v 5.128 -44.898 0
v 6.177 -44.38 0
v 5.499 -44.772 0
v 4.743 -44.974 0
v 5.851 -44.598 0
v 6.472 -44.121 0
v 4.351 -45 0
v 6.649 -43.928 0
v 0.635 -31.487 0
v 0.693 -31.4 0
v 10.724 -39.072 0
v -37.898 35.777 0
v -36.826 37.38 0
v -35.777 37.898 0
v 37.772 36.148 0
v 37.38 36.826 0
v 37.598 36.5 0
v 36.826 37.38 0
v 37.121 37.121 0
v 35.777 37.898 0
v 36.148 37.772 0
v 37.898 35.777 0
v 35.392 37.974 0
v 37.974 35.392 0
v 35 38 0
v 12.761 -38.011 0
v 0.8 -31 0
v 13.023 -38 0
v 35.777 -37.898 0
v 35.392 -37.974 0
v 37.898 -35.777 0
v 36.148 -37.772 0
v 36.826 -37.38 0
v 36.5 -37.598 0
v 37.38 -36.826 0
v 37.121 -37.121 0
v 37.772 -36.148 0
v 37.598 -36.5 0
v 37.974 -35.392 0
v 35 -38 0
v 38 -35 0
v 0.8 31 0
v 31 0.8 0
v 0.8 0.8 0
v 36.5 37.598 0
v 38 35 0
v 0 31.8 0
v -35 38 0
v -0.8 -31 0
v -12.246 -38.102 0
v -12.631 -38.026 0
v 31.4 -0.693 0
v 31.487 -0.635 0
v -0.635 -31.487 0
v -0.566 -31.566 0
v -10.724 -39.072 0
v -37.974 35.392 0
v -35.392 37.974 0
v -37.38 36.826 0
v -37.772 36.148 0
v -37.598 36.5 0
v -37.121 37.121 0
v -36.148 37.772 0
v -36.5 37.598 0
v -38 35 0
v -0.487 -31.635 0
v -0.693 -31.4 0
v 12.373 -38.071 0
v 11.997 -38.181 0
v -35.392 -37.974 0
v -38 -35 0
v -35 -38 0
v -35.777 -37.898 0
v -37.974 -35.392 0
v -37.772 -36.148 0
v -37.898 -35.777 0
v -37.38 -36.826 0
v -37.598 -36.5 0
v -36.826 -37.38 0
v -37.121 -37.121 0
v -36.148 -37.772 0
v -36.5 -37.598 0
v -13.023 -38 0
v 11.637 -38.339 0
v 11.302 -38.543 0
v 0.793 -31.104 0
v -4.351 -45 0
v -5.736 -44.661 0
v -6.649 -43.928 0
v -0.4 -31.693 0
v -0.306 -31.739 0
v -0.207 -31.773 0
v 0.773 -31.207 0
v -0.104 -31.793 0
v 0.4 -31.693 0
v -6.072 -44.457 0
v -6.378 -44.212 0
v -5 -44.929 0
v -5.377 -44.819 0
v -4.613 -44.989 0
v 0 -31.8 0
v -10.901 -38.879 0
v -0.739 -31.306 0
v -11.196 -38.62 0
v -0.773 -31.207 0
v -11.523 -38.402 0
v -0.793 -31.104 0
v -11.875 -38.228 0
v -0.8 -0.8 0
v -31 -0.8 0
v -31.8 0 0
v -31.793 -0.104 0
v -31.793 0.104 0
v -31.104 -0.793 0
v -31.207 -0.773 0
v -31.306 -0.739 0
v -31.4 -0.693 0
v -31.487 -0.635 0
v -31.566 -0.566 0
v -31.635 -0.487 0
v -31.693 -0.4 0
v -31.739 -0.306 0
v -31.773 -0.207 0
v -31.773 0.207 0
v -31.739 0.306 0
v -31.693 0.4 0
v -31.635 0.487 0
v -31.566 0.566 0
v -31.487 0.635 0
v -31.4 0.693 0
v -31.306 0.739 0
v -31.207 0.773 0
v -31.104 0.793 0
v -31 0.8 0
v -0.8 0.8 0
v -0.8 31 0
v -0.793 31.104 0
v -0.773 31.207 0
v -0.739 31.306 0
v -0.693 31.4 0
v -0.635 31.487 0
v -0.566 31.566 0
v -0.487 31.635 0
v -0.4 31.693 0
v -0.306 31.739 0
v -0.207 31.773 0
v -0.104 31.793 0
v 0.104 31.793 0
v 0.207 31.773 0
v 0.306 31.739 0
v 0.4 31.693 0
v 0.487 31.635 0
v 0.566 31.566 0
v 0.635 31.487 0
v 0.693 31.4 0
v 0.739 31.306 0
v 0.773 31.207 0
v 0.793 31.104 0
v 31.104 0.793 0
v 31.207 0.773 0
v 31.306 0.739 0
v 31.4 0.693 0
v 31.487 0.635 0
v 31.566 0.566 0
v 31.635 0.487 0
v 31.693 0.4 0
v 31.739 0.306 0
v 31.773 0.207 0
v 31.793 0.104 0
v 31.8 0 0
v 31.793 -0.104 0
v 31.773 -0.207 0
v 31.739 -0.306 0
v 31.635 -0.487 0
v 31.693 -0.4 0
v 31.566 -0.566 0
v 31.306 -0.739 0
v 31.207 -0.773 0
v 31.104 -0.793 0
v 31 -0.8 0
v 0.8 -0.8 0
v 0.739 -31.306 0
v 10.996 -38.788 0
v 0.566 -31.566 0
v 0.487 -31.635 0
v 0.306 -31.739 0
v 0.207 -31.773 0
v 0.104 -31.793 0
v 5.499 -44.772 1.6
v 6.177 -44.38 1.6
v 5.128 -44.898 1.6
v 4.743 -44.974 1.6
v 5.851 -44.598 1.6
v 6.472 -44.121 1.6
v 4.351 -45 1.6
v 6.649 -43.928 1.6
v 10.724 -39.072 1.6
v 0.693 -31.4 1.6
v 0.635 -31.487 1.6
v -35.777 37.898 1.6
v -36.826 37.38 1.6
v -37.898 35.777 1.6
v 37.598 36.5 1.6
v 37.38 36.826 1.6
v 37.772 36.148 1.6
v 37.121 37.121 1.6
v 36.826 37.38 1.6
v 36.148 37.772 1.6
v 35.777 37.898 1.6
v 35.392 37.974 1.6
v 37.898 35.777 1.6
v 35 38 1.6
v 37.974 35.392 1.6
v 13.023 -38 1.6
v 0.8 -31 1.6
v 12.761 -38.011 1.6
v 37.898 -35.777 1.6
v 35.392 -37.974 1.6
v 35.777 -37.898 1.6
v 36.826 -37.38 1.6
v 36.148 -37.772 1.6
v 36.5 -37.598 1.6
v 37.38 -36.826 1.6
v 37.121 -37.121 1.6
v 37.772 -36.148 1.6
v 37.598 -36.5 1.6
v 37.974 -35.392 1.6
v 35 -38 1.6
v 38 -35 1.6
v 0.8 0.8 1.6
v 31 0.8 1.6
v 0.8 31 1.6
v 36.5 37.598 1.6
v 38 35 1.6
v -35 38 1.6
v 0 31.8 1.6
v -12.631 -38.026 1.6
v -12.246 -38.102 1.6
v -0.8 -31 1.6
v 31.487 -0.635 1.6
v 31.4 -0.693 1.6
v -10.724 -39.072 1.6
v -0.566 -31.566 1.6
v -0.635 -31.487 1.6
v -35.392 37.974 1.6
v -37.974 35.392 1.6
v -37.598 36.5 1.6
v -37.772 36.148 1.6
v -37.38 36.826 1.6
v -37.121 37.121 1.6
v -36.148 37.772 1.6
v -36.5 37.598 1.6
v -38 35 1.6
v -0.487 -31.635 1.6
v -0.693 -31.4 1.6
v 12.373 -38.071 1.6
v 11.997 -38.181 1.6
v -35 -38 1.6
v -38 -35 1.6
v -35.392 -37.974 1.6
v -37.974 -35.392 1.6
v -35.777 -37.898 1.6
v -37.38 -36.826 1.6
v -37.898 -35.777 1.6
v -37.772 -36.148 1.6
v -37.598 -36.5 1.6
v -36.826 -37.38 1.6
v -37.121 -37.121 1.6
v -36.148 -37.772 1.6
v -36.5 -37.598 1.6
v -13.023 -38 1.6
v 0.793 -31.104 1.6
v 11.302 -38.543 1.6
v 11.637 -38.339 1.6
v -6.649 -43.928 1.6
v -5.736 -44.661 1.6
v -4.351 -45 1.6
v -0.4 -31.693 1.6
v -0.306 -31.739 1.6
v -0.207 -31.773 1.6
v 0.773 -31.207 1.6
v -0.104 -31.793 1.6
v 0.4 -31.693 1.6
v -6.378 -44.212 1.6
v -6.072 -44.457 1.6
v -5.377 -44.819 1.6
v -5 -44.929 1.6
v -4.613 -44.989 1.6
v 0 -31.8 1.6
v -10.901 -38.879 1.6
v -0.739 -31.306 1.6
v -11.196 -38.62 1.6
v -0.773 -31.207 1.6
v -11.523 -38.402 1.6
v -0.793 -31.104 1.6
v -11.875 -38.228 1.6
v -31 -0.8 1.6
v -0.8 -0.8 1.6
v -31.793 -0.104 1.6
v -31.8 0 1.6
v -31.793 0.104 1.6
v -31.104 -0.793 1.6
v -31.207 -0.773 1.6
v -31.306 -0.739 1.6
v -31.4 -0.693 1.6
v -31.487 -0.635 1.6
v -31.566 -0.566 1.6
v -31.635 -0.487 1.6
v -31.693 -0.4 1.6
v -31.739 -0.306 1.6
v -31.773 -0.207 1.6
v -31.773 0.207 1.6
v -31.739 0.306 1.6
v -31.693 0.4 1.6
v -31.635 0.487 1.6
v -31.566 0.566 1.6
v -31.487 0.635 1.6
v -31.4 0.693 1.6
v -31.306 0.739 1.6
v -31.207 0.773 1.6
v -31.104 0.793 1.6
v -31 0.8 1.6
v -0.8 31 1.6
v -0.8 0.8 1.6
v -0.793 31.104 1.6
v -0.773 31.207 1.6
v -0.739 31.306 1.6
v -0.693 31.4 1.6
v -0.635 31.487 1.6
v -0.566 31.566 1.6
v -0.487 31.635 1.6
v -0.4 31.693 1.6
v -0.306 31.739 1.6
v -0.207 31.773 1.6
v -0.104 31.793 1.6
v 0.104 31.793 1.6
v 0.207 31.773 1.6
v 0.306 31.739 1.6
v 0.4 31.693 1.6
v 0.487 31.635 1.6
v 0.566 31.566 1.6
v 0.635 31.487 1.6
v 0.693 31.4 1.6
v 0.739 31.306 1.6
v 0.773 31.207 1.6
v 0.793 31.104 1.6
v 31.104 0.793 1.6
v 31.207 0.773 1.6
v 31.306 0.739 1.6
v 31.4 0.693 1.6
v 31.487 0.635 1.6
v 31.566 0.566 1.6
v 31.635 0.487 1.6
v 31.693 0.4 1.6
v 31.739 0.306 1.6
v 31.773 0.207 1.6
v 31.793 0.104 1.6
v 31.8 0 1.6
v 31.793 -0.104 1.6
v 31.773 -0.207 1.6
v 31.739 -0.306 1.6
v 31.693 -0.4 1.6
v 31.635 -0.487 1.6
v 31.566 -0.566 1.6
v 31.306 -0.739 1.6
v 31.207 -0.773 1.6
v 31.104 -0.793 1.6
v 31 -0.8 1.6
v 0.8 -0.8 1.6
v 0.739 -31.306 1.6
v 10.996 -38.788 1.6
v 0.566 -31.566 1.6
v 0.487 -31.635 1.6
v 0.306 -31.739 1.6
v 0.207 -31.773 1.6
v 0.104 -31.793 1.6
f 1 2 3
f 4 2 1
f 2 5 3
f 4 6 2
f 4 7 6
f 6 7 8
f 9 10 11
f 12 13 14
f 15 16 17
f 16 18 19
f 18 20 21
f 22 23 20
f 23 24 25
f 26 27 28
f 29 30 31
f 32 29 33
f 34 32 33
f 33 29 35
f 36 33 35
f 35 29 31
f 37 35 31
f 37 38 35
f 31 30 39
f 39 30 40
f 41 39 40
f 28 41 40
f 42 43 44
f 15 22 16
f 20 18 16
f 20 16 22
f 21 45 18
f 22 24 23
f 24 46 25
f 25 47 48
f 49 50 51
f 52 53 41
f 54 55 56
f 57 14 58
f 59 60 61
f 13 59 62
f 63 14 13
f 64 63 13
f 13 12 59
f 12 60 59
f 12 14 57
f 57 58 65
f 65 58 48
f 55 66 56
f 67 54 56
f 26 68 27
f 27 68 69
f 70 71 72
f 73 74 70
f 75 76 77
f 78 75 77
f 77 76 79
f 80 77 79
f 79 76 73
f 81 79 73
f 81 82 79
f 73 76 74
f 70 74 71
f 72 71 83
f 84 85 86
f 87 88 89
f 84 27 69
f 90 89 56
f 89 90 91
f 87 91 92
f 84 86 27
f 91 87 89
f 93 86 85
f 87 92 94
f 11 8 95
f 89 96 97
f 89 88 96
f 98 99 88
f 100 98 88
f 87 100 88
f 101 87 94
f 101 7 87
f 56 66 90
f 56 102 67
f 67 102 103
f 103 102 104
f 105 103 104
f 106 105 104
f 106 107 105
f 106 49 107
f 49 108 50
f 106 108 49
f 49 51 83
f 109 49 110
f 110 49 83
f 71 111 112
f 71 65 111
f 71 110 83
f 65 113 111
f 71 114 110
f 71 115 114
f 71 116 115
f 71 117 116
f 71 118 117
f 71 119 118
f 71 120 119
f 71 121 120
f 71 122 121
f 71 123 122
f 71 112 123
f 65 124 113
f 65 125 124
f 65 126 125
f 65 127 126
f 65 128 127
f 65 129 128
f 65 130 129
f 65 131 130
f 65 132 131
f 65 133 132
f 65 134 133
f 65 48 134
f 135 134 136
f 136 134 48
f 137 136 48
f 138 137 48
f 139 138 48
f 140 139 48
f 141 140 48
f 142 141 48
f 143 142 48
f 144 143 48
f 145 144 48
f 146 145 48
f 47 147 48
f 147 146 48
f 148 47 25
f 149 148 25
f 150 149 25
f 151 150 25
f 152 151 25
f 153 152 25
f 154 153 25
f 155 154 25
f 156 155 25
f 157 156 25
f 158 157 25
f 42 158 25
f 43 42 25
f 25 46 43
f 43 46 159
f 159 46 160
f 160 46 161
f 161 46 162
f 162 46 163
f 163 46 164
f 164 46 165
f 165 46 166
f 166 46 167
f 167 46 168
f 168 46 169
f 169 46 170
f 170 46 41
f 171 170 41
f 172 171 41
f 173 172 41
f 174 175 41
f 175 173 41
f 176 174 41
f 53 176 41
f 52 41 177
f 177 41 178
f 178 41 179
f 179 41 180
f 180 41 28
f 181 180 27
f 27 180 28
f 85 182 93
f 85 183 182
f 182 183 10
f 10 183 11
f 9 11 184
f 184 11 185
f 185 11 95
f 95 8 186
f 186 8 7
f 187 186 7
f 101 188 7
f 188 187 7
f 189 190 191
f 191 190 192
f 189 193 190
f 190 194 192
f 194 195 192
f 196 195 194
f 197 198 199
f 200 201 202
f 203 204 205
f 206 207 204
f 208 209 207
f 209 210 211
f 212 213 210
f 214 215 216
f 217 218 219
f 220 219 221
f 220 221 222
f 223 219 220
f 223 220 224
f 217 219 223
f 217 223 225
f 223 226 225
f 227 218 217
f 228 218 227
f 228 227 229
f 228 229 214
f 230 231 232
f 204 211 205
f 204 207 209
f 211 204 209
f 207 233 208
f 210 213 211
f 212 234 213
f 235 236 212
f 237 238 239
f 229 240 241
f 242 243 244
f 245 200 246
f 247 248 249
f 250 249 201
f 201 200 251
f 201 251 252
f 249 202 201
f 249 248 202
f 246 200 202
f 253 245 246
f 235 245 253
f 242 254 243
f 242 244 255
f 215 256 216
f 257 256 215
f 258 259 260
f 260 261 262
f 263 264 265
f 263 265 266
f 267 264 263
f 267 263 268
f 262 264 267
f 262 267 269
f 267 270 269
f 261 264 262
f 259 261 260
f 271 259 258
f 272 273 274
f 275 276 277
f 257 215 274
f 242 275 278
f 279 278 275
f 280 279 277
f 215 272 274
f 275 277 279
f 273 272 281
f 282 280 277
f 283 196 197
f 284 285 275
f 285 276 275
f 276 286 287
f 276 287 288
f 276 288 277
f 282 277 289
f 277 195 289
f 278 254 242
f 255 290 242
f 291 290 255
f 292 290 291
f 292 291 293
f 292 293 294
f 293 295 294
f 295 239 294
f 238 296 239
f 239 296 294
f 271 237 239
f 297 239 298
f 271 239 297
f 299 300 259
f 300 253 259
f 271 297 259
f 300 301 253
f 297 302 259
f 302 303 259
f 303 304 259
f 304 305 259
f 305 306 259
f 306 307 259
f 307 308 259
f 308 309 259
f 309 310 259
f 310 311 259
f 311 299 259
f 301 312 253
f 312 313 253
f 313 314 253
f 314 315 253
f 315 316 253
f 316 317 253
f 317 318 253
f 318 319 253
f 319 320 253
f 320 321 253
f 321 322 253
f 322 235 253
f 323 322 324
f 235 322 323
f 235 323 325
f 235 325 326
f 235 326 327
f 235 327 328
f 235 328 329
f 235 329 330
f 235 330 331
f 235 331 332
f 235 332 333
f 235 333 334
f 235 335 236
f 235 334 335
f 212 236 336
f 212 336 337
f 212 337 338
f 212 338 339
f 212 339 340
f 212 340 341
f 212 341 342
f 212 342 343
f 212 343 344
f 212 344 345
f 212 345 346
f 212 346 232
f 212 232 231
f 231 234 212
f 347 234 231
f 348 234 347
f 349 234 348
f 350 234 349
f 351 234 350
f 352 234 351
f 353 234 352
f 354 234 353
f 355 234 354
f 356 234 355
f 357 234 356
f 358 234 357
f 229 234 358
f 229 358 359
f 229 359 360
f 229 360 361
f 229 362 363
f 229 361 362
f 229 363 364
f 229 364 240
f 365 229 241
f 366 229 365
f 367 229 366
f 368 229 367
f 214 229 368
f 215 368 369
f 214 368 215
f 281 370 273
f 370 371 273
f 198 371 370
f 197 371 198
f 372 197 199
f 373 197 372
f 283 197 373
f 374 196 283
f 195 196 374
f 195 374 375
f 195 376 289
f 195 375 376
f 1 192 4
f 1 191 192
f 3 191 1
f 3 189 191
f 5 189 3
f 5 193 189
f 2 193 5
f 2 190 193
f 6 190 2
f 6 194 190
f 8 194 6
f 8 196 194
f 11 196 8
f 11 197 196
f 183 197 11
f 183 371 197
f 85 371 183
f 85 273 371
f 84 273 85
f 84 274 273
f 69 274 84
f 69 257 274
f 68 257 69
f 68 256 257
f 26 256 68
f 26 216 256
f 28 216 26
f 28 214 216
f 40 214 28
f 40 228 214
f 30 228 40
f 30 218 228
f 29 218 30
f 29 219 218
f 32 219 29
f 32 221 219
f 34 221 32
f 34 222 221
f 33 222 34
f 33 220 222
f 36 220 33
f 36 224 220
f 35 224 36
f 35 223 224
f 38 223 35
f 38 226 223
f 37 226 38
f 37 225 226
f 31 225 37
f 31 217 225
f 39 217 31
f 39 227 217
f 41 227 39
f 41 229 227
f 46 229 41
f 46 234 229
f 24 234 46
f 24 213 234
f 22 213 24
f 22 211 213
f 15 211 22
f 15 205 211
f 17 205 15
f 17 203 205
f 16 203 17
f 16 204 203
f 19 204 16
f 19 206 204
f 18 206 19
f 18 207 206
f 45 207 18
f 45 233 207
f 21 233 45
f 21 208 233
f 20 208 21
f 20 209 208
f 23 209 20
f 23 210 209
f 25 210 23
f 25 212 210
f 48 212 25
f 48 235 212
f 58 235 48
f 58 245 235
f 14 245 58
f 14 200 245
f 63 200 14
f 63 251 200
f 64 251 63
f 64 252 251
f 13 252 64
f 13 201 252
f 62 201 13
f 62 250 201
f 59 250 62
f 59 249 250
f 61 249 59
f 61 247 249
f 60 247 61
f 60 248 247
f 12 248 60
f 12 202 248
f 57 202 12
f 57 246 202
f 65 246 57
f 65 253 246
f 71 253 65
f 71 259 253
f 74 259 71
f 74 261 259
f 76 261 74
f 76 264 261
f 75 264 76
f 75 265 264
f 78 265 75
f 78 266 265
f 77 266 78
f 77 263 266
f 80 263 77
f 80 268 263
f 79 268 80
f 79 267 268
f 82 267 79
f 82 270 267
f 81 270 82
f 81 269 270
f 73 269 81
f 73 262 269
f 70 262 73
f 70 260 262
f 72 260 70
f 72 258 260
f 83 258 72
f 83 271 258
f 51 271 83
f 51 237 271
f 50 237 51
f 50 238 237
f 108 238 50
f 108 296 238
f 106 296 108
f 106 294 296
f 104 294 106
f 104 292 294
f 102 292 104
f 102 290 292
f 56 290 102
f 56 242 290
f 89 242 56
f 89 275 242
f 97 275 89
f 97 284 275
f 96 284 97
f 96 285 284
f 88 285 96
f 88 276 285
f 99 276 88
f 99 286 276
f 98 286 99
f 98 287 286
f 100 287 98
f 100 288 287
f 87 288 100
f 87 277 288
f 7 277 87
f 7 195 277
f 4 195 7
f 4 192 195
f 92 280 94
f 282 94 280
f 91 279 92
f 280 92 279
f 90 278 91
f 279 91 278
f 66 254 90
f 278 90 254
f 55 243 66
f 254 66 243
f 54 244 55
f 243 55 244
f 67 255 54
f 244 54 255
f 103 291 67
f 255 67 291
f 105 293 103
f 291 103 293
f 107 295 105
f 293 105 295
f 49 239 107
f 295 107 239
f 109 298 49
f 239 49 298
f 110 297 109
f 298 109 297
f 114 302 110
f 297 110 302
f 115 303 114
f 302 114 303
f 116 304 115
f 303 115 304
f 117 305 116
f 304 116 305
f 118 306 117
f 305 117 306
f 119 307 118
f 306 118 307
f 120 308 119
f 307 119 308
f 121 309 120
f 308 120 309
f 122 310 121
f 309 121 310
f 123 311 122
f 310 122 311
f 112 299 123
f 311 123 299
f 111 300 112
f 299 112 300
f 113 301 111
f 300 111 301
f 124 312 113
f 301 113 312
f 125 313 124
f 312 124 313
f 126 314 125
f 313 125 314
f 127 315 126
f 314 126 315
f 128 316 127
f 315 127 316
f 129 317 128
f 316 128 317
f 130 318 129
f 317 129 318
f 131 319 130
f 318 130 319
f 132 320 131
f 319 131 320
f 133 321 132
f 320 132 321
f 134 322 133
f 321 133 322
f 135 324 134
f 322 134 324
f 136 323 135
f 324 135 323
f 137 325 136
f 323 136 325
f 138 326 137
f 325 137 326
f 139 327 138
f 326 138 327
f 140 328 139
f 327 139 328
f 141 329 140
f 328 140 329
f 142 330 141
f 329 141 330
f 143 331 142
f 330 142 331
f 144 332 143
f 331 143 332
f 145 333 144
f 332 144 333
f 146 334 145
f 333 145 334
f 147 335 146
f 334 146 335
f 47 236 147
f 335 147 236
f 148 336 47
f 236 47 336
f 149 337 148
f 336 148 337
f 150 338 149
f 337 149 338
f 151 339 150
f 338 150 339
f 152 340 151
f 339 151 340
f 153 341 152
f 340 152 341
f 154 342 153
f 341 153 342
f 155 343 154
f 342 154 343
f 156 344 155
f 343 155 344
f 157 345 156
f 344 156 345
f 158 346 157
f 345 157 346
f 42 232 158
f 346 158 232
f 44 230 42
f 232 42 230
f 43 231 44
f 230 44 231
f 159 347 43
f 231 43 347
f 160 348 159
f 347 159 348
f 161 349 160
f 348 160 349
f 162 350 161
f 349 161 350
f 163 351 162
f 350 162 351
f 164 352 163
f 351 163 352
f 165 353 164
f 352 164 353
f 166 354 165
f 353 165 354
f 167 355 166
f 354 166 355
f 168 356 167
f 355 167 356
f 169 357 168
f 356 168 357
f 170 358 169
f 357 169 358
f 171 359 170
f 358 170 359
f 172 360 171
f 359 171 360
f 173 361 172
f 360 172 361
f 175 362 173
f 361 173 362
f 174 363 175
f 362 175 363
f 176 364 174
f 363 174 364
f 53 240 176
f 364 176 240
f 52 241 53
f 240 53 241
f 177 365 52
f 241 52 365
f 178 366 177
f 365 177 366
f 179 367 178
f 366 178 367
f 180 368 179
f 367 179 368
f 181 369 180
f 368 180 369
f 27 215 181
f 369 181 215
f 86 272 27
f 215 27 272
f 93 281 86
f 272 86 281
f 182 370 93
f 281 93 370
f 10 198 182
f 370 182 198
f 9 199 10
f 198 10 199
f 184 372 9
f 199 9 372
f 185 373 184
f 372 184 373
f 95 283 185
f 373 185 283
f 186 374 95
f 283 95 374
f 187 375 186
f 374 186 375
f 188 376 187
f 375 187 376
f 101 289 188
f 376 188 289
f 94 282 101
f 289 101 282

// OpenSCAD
// file: stencil-common.scad
// Sticky-note stencil standard, shared by every generator -- OpenSCAD port of the Python
// prototype (../conform.py: sheet, tab; ../stencilgen.py: slot, box, rows). Keep the two in
// step: build.py renders every preset here and compares it with the prototype's outline.
//
// The standard (owner): a 76 mm square sheet, corners 3; one tab on its bottom edge --
// jorm's angled tab (MakerWorld 1409445, measured from its blank STEPs): 7 deep, sides 50
// degrees off the edge, every corner 3 round -- of a chosen top width at position 1 to 5.
// Bottom, because lying on the pad the tab sticks out toward the user: every pattern is
// drawn upright with its foot toward the tab. The pattern keeps MARGIN inside the edges;
// pen slots are SLOT wide with round ends. Nothing may cut off an island (a closed loop of
// slot, a letter with a counter): it would drop out.
//
// A generator includes this file while being developed; build.py inlines it for upload
// (MakerWorld takes one .scad file).

SQUARE = 76;             // a 3 x 3 inch note
CORNER_R = 3;
TAB_D = 7;               // [jorm]
TAB_ANGLE = 50;          // [jorm] the tab's sides, degrees off the sheet's edge
TAB_R = 3;               // [jorm]
POSITIONS = 5;
MARGIN = 7;
H = SQUARE / 2 - MARGIN; // the pattern's half extent
BOX = 5;                 // a checkbox; LARGE_BOX for the large ones
LARGE_BOX = 8;
GAP = 2;                 // between a box and its line
TITLE_GAP = 5;           // between the title bar and the first row (was 3)
TITLE = 9;               // a title bar's height: room to write in (owner: larger; was 5)

$fn = 48;

// the tab's width where it meets the sheet
function tab_base(w) = w + 2 * TAB_D / tan(TAB_ANGLE);

// position 1 to POSITIONS, evenly spaced for a tab of top width w, the base of 1 and of
// the last just clear of the sheet's corner rounding
function tab_centre(position, w) =
    let(span = SQUARE - 2 * CORNER_R - tab_base(w))
    -span / 2 + span * (position - 1) / (POSITIONS - 1);

// the sheet and its tab, 2D, centred on the origin, the tab on the bottom edge
module sheet(tab_width, tab_position) {
    x = tab_centre(tab_position, tab_width);
    e = -SQUARE / 2;
    b = tab_base(tab_width) / 2;
    t = tab_width / 2;
    // round the concave corners (the tab's foot), after the convex ones
    offset(r = -TAB_R) offset(delta = TAB_R)
    offset(r = CORNER_R) offset(delta = -CORNER_R)
    union() {
        square(SQUARE, center = true);
        polygon([[x - b, e + 1], [x + b, e + 1], [x + b, e], [x + t, e - TAB_D],
                 [x - t, e - TAB_D], [x - b, e]]);
    }
}

// a pen slot from p0 to p1, w wide, round ended
module slot(p0, p1, w) {
    hull() {
        translate(p0) circle(d = w);
        translate(p1) circle(d = w);
    }
}

// a checkbox centred at c: square (corners 0.5), circle, triangle (pointing down) or heart
module box(c, size, shape) {
    translate(c)
    if (shape == "square")
        offset(r = 0.5) square(size - 1, center = true);
    else if (shape == "circle")
        circle(d = size);
    else if (shape == "triangle")
        let(r = size / 2) polygon([[-r, 0.8 * r], [r, 0.8 * r], [0, -r]]);
    else if (shape == "heart")
        let(k = size / 32)
        polygon([for (i = [0 : 63]) let(a = 360 * i / 63)
            [16 * pow(sin(a), 3) * k,
             (13 * cos(a) - 5 * cos(2 * a) - 2 * cos(3 * a) - cos(4 * a)) * k + size * 0.05]]);
}

// n rows' centres, evenly from top to bottom
function rows_y(n, top, bottom) =
    n == 1 ? [(top + bottom) / 2] : [for (k = [0 : n - 1]) top - (top - bottom) * k / (n - 1)];

// a title bar across the top of the pattern
module title_bar() {
    offset(r = 0.8) offset(delta = -0.8) translate([-H, H - TITLE]) square([2 * H, TITLE]);
}

flat = false;            // true: the stencil's outline in 2D (build.py's check), not a part

// the finished stencil: the sheet, the pattern cut out, extruded
module stencil(tab_width, tab_position, thickness) {
    if (flat)
        difference() { sheet(tab_width, tab_position); children(); }
    else
        linear_extrude(thickness) difference() {
            sheet(tab_width, tab_position);
            children();
        }
}
// main file
// Sticky-note stencils: planners, a week, and grids -- for 3 x 3 inch (76 mm) notes. The
// tab sits on the edge toward you when the stencil lies on the pad; give each stencil in a
// set a different tab position (1 to 5) so all the tabs show when they are stacked.

/* [Stencil] */
// A ready-made stencil, or Custom grid to set the grid below
preset = "planner_quadrants"; // [planner_quadrants:Planner quadrants, planner_focus:Planner focus, planner_pros_cons:Planner pros and cons, planner_two_columns:Planner two columns, planner_two_rows:Planner two rows, week_labelled:Week with day letters, week_grid:Week grid only, grid_dots:Grid dots, grid_graph:Grid graph dots and axes, custom_grid:Custom grid]

/* [Tab] */
// Width across the top of the tab (11.5 lets five positions show; 15 suits three)
tab_width = 11.5; // [8:0.5:30]
// Where along the edge: 1 to 5 (for three tabs use 1, 3 and 5; for one, 3)
tab_position = 3; // [1:1:5]

/* [Print] */
// Stencil thickness (1.6 is 8 layers of 0.2)
thickness = 1.6; // [0.8:0.2:3]
// Width of the pen slots
slot_width = 1.6; // [1:0.1:2.5]

/* [Custom grid] */
// Spacing of the dots
grid_pitch = 5; // [3:0.5:10]
// Dot size
grid_dot = 1.6; // [1:0.1:3]
// Axes through the middle
grid_axes = false;

/* [Hidden] */
include <stencil-common.scad>

// presets: [name, kind, layout or labels, grid pitch, dot, axes]
PRESETS = [
    ["planner_quadrants", "planner", "quadrants"],
    ["planner_focus", "planner", "focus"],
    ["planner_pros_cons", "planner", "pros-cons"],
    ["planner_two_columns", "planner", "two-columns"],
    ["planner_two_rows", "planner", "two-rows"],
    ["week_labelled", "week", true],
    ["week_grid", "week", false],
    ["grid_dots", "grid", 5, 1.6, false],
    ["grid_graph", "grid", 5, 1.6, true],
];

P = preset == "custom_grid"
    ? ["custom_grid", "grid", grid_pitch, grid_dot, grid_axes]
    : PRESETS[search([preset], PRESETS)[0]];

module v(x, y0 = -H, y1 = H) slot([x, y0], [x, y1], slot_width);
module h(y, x0 = -H, x1 = H) slot([x0, y], [x1, y], slot_width);

module planner_pattern(layout) {
    if (layout == "quadrants") { v(0); h(0); }
    else if (layout == "focus") { v(0, -H, -H / 3); h(-H / 3); }
    else if (layout == "pros-cons") { v(0, -H, H - 8); h(H - 8); }
    else if (layout == "two-columns") v(0);
    else if (layout == "two-rows") h(0);
}

// day letters, drawn as pen strokes slot_width wide, as the lines are (owner, 2026-11-03:
// cut from a bold font at 3.65 their strokes were about 0.6, too narrow for a pen). Each
// glyph is polylines, the strokes' centre lines, on a LETTER_H box of its own width; none
// closes a loop, so nothing drops out. LETTER_GAP of sheet between strokes not joined,
// between letters, and between a letter and a slot.
// The S's ends stop short of its middle (35 and -145 degrees): at 20 and -160 they
// closed its counters at the widest slot (2.5), and those dropped out.
LETTER_H = 6;
LETTER_GAP = 1.2;
function glyph_w(ch) = ch == "M" ? 5.5 : ch == "W" ? 6.5 : ch == "F" ? 3.8 : ch == "S" ? 4.2 : 4.5;
function arc(cx, cy, rx, ry, a0, a1, n = 12) =
    [for (k = [0 : n]) let(a = a0 + (a1 - a0) * k / n) [cx + rx * cos(a), cy + ry * sin(a)]];
function glyph(ch) = let(w = glyph_w(ch), h = LETTER_H)
    ch == "M" ? [[[0, 0], [0, h], [w / 2, h * 0.4], [w, h], [w, 0]]]
  : ch == "T" ? [[[0, h], [w, h]], [[w / 2, h], [w / 2, 0]]]
  : ch == "W" ? [[[0, h], [w / 4, 0], [w / 2, h * 0.6], [3 * w / 4, 0], [w, h]]]
  : ch == "H" ? [[[0, 0], [0, h]], [[w, 0], [w, h]], [[0, h / 2], [w, h / 2]]]
  : ch == "F" ? [[[w, h], [0, h], [0, 0]], [[0, h / 2], [w * 0.8, h / 2]]]
  : ch == "S" ? [concat(arc(w / 2, h * 3 / 4, w / 2, h / 4, 35, 270),
                        [for (q = [1 : 12]) arc(w / 2, h / 4, w / 2, h / 4, 90, -145)[q]])]
  :             [concat([[0, h]], arc(w / 2, w / 2, w / 2, w / 2, 180, 360), [[w, h]])];   // U

// the text's strokes, their top left at (x, y_top)
module lettering(text, x, y_top, i = 0) {
    if (i < len(text)) {
        for (line = glyph(text[i]), k = [0 : len(line) - 2])
            slot([x + line[k][0], y_top - LETTER_H + line[k][1]],
                 [x + line[k + 1][0], y_top - LETTER_H + line[k + 1][1]], slot_width);
        lettering(text, x + glyph_w(text[i]) + slot_width + LETTER_GAP, y_top, i + 1);
    }
}

// a 7-day week: two columns of four, the last cell for notes; day letters in each cell's
// top left, slot_width + LETTER_GAP in from its slots (the sheet's margin for the top and
// left ones)
module week_pattern(labels) {
    v(0);
    for (y = [H / 2, 0, -H / 2]) h(y);
    if (labels) {
        days = ["M", "T", "W", "TH", "F", "S", "SU"];
        cells = [[-H, H], [0, H], [-H, H / 2], [0, H / 2], [-H, 0], [0, 0], [-H, -H / 2]];
        inset = slot_width + LETTER_GAP;
        for (i = [0 : 6]) lettering(days[i], cells[i][0] + inset, cells[i][1] - inset);
    }
}

// dots on a pitch; with axes, a slot each way through the middle
module grid_pattern(pitch, dot, axes) {
    n = floor(2 * H / pitch);
    off = -(n * pitch) / 2;
    for (i = [0 : n], j = [0 : n]) {
        x = off + i * pitch;
        y = off + j * pitch;
        if (!(axes && (abs(x) < 0.01 || abs(y) < 0.01)))
            translate([x, y]) circle(d = dot);
    }
    if (axes) { h(0); v(0); }
}

stencil(tab_width, tab_position, thickness)
    if (P[1] == "planner") planner_pattern(P[2]);
    else if (P[1] == "week") week_pattern(P[2]);
    else grid_pattern(P[2], P[3], P[4]);
